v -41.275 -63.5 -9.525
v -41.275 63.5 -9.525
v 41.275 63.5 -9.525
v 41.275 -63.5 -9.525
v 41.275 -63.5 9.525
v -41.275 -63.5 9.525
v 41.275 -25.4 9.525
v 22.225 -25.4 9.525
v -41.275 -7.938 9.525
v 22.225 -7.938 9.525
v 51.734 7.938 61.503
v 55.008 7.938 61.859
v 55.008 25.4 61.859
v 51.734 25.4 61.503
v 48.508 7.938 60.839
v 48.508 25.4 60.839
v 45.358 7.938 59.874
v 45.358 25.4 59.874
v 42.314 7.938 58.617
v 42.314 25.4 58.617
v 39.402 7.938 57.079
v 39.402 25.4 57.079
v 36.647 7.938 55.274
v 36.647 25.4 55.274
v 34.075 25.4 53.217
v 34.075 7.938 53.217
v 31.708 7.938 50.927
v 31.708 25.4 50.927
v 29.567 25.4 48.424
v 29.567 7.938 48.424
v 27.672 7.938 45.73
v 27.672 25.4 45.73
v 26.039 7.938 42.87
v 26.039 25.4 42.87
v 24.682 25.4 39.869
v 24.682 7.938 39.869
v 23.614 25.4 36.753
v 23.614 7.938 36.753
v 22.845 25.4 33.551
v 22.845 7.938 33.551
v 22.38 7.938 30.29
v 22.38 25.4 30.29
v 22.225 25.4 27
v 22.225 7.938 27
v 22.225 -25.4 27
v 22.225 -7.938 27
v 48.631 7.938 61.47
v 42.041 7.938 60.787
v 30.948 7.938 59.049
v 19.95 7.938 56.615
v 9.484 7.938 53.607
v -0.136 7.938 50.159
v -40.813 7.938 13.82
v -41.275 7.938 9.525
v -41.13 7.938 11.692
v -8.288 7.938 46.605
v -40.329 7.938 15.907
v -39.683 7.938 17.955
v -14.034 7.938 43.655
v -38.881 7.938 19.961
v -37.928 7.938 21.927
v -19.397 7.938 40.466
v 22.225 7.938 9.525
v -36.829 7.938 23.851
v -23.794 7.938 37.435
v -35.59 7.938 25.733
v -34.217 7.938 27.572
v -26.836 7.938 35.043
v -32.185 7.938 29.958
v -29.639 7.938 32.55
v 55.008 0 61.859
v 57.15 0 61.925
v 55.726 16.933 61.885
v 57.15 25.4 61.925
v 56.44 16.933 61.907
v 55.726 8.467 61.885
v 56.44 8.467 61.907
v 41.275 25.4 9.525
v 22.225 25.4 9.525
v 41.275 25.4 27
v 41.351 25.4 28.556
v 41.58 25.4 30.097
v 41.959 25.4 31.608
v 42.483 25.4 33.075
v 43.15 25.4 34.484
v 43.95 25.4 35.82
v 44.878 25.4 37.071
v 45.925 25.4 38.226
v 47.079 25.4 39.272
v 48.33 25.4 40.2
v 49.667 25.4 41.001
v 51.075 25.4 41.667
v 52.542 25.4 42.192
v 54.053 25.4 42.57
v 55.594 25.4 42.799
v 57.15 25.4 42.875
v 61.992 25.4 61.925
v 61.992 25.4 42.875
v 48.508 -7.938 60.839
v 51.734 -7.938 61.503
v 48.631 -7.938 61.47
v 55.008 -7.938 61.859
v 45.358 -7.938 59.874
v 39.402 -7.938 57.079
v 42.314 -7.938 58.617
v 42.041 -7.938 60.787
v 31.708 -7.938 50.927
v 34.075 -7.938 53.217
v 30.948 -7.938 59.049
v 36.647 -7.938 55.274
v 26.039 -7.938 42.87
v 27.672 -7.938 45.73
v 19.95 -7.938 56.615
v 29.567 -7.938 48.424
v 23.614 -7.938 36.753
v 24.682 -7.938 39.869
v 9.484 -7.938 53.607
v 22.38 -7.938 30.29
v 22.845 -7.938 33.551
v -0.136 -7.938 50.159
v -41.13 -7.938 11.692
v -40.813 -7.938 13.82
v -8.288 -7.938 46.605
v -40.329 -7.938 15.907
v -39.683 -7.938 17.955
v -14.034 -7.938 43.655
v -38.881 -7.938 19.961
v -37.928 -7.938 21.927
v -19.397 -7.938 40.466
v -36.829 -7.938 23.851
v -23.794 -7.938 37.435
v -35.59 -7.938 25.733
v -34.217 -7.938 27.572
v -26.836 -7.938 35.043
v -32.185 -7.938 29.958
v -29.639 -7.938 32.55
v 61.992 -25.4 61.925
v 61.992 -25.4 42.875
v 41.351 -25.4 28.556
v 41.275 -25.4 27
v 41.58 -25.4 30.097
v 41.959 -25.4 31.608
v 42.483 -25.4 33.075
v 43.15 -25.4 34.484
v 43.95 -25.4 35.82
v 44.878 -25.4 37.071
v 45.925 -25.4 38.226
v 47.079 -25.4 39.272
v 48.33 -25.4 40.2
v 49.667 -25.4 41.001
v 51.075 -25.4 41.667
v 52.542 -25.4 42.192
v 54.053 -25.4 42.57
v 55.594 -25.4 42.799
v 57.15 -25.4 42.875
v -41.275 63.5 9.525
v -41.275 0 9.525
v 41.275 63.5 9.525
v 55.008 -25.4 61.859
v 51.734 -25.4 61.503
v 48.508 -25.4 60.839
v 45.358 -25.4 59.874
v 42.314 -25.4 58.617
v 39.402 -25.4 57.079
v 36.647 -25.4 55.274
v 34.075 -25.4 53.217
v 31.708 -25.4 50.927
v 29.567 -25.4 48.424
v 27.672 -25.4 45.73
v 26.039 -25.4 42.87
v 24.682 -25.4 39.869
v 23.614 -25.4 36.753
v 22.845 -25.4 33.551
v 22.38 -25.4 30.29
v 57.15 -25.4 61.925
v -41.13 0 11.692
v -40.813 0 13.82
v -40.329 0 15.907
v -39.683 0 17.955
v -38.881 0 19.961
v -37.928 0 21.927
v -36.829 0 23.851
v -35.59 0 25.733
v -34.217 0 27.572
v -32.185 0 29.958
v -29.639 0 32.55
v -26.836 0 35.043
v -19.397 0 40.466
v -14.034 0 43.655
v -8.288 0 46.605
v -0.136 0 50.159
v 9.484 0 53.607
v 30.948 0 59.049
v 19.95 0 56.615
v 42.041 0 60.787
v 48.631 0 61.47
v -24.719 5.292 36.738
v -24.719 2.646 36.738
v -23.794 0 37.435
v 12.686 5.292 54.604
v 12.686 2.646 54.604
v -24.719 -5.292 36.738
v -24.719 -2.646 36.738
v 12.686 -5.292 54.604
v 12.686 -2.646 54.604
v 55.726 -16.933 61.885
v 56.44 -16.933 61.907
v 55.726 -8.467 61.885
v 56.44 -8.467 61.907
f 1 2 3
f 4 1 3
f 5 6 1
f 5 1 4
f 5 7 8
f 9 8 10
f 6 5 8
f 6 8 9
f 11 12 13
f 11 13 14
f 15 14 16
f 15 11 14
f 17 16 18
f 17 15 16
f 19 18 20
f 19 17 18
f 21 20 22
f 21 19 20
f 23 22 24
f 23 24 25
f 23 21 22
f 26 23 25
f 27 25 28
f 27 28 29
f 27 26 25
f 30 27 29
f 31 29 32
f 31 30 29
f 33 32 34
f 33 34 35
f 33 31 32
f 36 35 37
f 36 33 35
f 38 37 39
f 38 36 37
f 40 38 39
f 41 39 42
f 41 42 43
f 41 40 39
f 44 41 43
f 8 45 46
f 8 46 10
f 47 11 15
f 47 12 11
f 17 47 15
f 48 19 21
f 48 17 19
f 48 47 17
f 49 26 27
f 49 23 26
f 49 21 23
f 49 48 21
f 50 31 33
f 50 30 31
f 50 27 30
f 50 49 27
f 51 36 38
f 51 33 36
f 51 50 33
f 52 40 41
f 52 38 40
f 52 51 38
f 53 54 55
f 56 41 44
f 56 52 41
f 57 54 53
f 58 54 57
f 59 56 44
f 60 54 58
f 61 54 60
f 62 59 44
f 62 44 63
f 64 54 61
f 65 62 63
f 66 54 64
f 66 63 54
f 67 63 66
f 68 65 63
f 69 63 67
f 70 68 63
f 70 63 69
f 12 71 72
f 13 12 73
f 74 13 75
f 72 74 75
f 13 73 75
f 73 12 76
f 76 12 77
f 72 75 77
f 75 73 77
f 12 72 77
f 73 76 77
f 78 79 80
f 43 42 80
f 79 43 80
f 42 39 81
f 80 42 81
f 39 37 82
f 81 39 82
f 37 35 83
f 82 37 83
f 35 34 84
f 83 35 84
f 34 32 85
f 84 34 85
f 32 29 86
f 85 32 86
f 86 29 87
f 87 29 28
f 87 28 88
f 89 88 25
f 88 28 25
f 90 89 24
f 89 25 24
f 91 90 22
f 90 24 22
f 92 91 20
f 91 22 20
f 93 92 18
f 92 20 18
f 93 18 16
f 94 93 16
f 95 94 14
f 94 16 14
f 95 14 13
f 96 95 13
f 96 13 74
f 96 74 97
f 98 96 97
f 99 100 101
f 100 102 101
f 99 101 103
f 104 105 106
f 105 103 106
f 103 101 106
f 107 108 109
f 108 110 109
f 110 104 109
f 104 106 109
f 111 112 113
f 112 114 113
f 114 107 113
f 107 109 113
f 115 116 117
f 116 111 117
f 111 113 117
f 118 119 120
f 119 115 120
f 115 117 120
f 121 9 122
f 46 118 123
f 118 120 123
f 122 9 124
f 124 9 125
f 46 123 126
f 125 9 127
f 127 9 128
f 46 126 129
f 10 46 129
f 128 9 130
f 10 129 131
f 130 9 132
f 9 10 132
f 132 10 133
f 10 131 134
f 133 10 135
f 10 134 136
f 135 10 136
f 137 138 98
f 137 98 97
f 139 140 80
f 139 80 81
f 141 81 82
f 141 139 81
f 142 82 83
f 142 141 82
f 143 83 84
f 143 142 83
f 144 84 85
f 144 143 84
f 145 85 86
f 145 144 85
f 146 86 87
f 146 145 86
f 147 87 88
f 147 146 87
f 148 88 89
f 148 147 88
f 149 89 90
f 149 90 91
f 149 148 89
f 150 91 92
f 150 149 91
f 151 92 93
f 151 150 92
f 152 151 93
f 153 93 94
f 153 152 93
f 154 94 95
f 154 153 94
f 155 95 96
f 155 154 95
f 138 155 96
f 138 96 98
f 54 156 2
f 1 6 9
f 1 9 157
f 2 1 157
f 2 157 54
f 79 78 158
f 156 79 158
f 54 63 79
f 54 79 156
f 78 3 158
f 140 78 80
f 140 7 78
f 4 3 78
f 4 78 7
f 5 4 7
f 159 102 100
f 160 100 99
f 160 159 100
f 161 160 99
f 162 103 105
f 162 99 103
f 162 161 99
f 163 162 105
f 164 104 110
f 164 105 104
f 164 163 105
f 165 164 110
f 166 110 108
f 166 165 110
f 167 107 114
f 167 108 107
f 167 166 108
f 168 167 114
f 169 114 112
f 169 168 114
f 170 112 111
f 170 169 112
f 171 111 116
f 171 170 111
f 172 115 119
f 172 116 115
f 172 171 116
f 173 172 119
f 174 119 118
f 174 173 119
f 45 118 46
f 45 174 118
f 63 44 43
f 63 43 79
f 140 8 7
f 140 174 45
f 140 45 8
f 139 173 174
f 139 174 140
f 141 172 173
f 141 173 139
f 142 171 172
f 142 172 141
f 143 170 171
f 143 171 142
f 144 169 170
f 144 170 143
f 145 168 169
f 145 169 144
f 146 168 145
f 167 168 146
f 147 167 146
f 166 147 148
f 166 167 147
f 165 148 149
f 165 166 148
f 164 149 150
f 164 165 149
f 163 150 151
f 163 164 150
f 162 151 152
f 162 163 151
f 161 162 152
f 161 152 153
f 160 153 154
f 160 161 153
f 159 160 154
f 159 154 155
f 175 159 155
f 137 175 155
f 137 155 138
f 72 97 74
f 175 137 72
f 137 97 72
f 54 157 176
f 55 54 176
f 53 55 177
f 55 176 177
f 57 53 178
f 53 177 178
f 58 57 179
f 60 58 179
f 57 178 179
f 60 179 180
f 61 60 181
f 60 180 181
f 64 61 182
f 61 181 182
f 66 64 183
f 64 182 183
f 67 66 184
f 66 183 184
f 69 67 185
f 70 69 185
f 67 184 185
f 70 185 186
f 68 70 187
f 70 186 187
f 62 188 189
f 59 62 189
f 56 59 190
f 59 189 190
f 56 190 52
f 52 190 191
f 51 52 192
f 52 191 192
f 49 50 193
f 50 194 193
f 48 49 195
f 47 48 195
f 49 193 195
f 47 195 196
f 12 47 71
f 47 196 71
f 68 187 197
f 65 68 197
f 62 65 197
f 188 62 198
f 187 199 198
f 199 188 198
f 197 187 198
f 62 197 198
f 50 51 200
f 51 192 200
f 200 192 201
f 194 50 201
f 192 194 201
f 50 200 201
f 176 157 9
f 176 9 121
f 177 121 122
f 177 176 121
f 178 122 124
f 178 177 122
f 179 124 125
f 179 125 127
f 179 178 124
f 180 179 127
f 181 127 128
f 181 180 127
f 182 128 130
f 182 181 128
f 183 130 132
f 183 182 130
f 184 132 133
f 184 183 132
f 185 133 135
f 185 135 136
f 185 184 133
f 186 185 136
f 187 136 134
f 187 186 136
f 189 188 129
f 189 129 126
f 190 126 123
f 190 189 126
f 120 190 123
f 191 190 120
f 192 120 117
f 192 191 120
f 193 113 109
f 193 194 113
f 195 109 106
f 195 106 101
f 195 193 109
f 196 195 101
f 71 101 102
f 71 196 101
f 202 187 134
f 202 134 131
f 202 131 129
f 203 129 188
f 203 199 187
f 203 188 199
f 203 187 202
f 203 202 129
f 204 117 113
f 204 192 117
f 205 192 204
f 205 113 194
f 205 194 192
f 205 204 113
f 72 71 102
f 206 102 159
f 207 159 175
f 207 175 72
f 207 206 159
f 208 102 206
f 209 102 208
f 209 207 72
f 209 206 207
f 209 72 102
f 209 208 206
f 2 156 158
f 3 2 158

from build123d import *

# Parameters (mm, degrees)
F1_DEPTH = 63.5
F2_DEPTH = 25.4
F3_DEPTH = 7.9375


with BuildPart() as f1:
    # F0 (on Front) → F1 (new body, symmetric)
    with BuildSketch(Plane.XZ):
        Polygon((-41.275, 9.525), (-41.275, -9.525), (41.275, -9.525), (41.275, 9.525), (22.225, 9.525), align=None)
    extrude(amount=F1_DEPTH, both=True)

    # F0 (on Front) → F2 (join, symmetric)
    with BuildSketch(Plane.XZ):
        with BuildLine():
            Line((22.225, 9.525), (41.275, 9.525))
            Line((41.275, 9.525), (41.275, 27.0002))
            ThreePointArc((41.275, 27.0002), (45.92468, 38.22552), (57.15, 42.8752))
            Line((57.15, 42.8752), (61.991871, 42.8752))
            Line((61.991871, 42.8752), (61.991871, 61.9252))
            Line((61.991871, 61.9252), (57.15, 61.9252))
            add(Edge.make_bspline(
                [(55.007715, 61.859435), (55.727449, 61.887292), (56.441689, 61.909225), (57.15, 61.9252)],
                knots=[109.507647, 109.507647, 109.507647, 109.507647, 111.504536, 111.504536, 111.504536, 111.504536], degree=3))
            ThreePointArc((55.007715, 61.859435), (31.708155, 50.926507), (22.225, 27.0002))
            Line((22.225, 27.0002), (22.225, 9.525))
        make_face()
    extrude(amount=F2_DEPTH, both=True)

    # F0 (on Front) → F3 (join, symmetric)
    with BuildSketch(Plane.XZ):
        with BuildLine():
            add(Edge.make_bspline(
                [(-41.275, 9.525), (-40.454127, 40.988729), (15.538124, 60.331766), (55.007715, 61.859435)],
                knots=[0, 0, 0, 0, 109.507647, 109.507647, 109.507647, 109.507647], degree=3))
            Line((-41.275, 9.525), (22.225, 9.525))
            Line((22.225, 9.525), (22.225, 27.0002))
            ThreePointArc((22.225, 27.0002), (31.708155, 50.926507), (55.007715, 61.859435))
        make_face()
    extrude(amount=F3_DEPTH, both=True)


solid = f1.part
